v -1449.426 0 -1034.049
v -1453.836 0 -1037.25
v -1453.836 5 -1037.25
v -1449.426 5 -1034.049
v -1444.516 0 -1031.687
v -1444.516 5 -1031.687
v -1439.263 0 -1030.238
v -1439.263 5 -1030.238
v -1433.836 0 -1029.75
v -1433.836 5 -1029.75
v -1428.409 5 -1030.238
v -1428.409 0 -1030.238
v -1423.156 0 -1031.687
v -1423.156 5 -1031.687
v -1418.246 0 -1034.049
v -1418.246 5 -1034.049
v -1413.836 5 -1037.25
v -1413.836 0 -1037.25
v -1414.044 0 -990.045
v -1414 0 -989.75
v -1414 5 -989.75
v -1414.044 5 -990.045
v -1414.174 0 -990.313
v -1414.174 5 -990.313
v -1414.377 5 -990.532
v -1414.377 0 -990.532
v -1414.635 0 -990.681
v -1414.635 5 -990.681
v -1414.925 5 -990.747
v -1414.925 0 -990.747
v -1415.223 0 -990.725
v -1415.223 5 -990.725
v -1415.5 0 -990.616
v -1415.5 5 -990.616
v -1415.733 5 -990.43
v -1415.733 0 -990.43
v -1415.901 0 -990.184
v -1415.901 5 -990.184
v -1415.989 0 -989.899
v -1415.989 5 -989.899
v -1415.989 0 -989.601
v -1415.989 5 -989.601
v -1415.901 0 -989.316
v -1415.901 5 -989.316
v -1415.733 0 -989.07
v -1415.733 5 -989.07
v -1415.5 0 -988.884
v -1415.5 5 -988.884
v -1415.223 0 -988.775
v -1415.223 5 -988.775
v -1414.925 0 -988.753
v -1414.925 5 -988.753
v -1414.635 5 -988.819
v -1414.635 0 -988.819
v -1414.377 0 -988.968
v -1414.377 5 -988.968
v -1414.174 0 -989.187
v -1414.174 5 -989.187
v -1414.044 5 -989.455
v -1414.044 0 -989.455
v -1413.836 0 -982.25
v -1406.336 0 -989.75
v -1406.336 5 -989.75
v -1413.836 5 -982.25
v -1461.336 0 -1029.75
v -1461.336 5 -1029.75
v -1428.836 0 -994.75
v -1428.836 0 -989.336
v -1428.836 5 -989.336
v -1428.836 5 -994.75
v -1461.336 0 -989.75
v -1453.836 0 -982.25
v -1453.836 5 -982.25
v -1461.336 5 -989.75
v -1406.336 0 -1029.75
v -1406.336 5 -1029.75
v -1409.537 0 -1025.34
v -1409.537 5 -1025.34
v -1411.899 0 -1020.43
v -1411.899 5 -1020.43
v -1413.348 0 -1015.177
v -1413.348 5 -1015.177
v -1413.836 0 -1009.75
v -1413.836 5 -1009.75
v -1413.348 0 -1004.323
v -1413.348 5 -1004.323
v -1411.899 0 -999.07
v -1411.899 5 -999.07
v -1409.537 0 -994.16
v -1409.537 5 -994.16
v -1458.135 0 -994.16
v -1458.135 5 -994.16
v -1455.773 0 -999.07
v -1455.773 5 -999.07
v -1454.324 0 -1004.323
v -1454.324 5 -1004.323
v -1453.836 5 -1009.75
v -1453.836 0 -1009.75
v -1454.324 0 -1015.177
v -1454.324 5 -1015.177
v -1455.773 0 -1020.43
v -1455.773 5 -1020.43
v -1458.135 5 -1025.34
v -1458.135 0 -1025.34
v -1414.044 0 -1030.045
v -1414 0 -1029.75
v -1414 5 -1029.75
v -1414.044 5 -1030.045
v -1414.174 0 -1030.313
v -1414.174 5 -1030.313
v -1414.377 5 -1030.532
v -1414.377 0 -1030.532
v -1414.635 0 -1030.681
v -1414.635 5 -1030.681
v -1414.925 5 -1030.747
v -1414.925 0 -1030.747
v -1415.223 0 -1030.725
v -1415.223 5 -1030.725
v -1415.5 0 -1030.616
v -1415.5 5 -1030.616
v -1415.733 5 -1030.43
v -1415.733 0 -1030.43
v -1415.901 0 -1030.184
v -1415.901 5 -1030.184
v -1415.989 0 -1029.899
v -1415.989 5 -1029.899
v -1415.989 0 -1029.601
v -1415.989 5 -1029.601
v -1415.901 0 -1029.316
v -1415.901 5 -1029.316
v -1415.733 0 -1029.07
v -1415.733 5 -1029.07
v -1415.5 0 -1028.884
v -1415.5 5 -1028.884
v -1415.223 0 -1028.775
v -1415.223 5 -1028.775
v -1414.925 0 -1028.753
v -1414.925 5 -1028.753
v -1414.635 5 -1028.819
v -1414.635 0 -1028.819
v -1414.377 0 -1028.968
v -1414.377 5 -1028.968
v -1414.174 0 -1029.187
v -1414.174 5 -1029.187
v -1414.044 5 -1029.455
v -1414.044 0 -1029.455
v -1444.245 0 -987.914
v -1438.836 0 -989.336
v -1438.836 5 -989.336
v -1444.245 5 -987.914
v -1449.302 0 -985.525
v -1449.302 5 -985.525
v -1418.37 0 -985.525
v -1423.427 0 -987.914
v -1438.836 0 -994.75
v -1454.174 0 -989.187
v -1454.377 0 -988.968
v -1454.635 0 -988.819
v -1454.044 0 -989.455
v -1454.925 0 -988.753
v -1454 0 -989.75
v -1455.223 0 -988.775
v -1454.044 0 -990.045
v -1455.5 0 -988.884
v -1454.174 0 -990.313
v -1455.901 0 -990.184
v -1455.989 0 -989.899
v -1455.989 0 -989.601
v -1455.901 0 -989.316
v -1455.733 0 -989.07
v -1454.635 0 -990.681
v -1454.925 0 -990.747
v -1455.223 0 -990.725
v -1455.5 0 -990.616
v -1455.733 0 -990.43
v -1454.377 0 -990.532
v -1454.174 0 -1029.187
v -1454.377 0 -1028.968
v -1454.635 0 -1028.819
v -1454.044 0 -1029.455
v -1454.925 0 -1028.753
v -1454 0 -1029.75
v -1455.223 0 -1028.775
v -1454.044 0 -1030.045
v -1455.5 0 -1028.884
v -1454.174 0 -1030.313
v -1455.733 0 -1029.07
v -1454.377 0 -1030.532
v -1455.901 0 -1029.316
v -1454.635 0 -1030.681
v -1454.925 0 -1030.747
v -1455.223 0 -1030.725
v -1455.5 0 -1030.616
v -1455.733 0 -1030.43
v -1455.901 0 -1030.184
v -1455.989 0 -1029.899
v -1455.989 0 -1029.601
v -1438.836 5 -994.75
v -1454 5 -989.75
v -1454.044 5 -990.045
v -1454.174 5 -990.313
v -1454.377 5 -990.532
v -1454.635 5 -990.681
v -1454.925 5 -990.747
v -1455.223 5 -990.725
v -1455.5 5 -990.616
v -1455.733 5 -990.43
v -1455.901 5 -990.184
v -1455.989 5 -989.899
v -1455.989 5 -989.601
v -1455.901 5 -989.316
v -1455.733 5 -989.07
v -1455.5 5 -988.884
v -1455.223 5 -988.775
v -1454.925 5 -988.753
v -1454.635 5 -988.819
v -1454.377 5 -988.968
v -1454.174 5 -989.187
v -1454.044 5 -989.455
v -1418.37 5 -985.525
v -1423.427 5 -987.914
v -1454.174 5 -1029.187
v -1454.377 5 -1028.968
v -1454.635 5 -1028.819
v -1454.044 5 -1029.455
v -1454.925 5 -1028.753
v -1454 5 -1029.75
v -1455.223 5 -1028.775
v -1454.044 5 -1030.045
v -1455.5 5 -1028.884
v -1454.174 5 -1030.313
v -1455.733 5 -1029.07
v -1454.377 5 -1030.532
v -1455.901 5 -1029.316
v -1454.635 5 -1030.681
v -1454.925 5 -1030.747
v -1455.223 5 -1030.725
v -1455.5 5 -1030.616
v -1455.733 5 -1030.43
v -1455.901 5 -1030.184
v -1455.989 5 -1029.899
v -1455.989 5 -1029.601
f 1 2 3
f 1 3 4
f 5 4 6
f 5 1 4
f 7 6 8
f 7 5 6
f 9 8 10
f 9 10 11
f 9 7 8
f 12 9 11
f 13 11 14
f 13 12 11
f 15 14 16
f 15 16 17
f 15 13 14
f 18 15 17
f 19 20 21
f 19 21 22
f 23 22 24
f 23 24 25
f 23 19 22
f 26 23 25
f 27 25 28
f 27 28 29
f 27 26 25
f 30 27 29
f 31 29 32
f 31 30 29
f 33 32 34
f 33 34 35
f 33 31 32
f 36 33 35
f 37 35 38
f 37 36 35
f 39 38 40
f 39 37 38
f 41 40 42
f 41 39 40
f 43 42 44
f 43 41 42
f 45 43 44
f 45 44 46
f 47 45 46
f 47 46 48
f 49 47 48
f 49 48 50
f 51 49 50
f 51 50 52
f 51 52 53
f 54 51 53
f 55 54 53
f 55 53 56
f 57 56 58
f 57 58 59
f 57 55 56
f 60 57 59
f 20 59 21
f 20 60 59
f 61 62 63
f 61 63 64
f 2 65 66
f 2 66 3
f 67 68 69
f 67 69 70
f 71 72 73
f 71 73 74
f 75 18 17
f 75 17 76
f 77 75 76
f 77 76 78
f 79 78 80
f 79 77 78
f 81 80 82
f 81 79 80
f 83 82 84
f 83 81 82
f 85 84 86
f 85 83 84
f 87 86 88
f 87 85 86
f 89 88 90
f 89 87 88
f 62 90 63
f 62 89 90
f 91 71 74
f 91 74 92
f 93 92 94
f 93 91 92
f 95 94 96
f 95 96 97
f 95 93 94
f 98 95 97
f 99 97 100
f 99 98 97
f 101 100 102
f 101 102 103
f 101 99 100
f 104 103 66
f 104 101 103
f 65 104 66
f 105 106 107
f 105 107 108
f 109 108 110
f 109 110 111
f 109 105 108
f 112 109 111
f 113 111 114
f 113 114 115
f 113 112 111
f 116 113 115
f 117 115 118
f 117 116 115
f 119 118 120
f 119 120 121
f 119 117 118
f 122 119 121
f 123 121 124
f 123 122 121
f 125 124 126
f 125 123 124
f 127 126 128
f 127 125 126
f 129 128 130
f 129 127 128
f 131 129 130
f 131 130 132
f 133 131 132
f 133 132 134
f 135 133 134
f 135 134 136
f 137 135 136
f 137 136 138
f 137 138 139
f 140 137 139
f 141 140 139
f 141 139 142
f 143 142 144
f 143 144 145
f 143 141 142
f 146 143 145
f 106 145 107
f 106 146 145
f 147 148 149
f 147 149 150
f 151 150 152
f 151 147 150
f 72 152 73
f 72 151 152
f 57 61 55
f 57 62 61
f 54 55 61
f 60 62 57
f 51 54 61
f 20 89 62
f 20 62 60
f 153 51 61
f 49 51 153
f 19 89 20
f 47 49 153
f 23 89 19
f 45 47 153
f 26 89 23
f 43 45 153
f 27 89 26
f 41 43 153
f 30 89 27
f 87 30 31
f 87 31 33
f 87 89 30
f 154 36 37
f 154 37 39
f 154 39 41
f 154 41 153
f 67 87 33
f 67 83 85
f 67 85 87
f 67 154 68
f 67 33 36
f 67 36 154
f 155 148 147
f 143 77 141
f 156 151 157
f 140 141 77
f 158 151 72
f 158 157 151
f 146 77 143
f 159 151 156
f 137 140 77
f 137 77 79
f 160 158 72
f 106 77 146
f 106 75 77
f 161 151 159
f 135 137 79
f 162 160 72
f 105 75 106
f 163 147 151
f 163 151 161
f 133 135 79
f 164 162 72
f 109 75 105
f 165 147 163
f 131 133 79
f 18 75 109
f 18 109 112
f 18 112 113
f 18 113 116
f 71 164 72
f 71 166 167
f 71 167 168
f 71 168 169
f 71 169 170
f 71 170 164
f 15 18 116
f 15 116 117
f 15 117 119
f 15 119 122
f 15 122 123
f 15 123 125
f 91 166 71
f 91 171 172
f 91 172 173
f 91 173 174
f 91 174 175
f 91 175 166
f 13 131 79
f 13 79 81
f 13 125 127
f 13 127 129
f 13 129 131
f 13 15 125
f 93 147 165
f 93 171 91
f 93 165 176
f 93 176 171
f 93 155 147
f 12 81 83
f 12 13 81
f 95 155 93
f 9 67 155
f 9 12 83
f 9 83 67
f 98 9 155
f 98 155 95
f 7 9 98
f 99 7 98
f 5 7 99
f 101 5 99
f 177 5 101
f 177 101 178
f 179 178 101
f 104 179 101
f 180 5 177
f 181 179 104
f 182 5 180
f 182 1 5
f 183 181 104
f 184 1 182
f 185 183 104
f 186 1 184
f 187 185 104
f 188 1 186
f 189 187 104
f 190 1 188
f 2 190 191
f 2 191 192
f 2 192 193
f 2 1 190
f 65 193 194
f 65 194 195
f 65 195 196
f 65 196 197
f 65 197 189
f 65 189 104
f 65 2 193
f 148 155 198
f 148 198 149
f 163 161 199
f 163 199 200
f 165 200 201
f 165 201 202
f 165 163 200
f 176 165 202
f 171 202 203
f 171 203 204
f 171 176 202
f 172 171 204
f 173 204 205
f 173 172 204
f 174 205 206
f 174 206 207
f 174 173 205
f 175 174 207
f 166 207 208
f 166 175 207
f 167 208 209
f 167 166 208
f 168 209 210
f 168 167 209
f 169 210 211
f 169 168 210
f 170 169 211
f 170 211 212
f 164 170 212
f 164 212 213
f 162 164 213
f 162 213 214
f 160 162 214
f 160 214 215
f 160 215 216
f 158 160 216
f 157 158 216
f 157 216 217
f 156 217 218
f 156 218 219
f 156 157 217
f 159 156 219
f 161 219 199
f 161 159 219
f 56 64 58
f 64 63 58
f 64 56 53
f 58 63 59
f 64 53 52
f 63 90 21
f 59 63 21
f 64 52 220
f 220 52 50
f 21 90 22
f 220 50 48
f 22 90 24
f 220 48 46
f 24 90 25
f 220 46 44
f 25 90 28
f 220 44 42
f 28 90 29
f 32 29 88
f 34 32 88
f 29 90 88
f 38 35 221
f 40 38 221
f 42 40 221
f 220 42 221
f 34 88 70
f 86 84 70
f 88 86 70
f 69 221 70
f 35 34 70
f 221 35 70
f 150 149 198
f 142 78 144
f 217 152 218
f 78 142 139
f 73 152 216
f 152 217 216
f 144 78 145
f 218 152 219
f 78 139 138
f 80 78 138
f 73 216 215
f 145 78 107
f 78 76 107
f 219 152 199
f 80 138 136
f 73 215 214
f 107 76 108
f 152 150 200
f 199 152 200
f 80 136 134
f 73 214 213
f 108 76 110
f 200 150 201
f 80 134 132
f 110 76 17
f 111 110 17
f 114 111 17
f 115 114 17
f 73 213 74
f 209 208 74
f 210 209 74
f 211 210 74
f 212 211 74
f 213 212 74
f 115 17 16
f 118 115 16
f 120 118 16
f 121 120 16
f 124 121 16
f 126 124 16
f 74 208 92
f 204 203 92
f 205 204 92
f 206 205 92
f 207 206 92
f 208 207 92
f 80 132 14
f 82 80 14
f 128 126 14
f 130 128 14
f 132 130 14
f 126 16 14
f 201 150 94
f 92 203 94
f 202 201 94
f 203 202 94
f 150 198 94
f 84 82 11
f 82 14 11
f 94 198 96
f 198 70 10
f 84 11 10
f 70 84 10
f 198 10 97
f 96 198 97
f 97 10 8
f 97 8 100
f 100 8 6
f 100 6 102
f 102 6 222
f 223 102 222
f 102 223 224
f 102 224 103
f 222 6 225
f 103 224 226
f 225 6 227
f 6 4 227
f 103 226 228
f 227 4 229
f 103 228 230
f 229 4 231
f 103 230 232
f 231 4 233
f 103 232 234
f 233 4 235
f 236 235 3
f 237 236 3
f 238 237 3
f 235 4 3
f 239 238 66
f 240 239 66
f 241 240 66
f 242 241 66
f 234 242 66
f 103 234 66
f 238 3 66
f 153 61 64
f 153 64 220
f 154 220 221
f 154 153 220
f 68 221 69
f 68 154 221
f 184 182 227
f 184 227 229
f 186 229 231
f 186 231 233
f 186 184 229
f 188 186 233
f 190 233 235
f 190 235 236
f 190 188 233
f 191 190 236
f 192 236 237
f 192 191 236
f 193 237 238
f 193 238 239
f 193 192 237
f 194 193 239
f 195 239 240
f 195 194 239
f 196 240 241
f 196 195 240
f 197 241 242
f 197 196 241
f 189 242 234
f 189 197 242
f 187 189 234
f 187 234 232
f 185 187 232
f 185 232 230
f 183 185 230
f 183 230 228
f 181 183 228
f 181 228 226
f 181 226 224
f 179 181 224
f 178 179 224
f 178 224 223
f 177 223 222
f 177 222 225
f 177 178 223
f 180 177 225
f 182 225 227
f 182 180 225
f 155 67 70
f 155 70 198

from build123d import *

# Parameters (mm, degrees)
SKETCH1_R           = 1
BOSS_EXTRUDE1_DEPTH = 5


with BuildPart() as part:
    # Sketch1 → Boss-Extrude1 (new body)
    with BuildSketch(Plane(origin=(0, 0, 0), x_dir=(1, 0, 0), z_dir=(0, 1, 0))):
        with BuildLine():
            ThreePointArc((-1438.835902455, 989.336226708), (-1446.828348365, 986.835514311), (-1453.835902334, 982.25))
            Line((-1453.835902334, 982.25), (-1461.335900746, 989.750001588))
            ThreePointArc((-1461.335900746, 989.750001588), (-1453.835896511, 1009.75), (-1461.335892276, 1029.750001588))
            Line((-1461.335892276, 1029.750001588), (-1453.835890688, 1037.25))
            ThreePointArc((-1453.835890688, 1037.25), (-1433.835890688, 1029.75), (-1413.835890688, 1037.25))
            Line((-1413.835890688, 1037.25), (-1406.335890688, 1029.749996824))
            ThreePointArc((-1406.335890688, 1029.749996824), (-1413.835886887, 1009.750002768), (-1406.335890688, 989.750008712))
            Line((-1406.335890688, 989.750008712), (-1413.835902577, 982.25))
            ThreePointArc((-1413.835902577, 982.25), (-1420.843456545, 986.835514311), (-1428.835902455, 989.336226708))
            Line((-1428.835902455, 989.336226708), (-1428.835902455, 989.75))
            Line((-1428.835902455, 989.75), (-1428.835902455, 994.75))
            Line((-1428.835902455, 994.75), (-1433.835902455, 994.75))
            Line((-1433.835902455, 994.75), (-1438.835902455, 994.75))
            Line((-1438.835902455, 994.75), (-1438.835902455, 989.75))
            Line((-1438.835902455, 989.75), (-1438.835902455, 989.336226708))
        make_face()
        with Locations((-1415, 989.75)):
            Circle(SKETCH1_R, mode=Mode.SUBTRACT)
        with Locations((-1455.000010057, 989.75)):
            Circle(SKETCH1_R, mode=Mode.SUBTRACT)
        with Locations((-1415, 1029.75)):
            Circle(SKETCH1_R, mode=Mode.SUBTRACT)
        with Locations((-1455.000001588, 1029.75)):
            Circle(SKETCH1_R, mode=Mode.SUBTRACT)
    extrude(amount=BOSS_EXTRUDE1_DEPTH)


solid = part.part
